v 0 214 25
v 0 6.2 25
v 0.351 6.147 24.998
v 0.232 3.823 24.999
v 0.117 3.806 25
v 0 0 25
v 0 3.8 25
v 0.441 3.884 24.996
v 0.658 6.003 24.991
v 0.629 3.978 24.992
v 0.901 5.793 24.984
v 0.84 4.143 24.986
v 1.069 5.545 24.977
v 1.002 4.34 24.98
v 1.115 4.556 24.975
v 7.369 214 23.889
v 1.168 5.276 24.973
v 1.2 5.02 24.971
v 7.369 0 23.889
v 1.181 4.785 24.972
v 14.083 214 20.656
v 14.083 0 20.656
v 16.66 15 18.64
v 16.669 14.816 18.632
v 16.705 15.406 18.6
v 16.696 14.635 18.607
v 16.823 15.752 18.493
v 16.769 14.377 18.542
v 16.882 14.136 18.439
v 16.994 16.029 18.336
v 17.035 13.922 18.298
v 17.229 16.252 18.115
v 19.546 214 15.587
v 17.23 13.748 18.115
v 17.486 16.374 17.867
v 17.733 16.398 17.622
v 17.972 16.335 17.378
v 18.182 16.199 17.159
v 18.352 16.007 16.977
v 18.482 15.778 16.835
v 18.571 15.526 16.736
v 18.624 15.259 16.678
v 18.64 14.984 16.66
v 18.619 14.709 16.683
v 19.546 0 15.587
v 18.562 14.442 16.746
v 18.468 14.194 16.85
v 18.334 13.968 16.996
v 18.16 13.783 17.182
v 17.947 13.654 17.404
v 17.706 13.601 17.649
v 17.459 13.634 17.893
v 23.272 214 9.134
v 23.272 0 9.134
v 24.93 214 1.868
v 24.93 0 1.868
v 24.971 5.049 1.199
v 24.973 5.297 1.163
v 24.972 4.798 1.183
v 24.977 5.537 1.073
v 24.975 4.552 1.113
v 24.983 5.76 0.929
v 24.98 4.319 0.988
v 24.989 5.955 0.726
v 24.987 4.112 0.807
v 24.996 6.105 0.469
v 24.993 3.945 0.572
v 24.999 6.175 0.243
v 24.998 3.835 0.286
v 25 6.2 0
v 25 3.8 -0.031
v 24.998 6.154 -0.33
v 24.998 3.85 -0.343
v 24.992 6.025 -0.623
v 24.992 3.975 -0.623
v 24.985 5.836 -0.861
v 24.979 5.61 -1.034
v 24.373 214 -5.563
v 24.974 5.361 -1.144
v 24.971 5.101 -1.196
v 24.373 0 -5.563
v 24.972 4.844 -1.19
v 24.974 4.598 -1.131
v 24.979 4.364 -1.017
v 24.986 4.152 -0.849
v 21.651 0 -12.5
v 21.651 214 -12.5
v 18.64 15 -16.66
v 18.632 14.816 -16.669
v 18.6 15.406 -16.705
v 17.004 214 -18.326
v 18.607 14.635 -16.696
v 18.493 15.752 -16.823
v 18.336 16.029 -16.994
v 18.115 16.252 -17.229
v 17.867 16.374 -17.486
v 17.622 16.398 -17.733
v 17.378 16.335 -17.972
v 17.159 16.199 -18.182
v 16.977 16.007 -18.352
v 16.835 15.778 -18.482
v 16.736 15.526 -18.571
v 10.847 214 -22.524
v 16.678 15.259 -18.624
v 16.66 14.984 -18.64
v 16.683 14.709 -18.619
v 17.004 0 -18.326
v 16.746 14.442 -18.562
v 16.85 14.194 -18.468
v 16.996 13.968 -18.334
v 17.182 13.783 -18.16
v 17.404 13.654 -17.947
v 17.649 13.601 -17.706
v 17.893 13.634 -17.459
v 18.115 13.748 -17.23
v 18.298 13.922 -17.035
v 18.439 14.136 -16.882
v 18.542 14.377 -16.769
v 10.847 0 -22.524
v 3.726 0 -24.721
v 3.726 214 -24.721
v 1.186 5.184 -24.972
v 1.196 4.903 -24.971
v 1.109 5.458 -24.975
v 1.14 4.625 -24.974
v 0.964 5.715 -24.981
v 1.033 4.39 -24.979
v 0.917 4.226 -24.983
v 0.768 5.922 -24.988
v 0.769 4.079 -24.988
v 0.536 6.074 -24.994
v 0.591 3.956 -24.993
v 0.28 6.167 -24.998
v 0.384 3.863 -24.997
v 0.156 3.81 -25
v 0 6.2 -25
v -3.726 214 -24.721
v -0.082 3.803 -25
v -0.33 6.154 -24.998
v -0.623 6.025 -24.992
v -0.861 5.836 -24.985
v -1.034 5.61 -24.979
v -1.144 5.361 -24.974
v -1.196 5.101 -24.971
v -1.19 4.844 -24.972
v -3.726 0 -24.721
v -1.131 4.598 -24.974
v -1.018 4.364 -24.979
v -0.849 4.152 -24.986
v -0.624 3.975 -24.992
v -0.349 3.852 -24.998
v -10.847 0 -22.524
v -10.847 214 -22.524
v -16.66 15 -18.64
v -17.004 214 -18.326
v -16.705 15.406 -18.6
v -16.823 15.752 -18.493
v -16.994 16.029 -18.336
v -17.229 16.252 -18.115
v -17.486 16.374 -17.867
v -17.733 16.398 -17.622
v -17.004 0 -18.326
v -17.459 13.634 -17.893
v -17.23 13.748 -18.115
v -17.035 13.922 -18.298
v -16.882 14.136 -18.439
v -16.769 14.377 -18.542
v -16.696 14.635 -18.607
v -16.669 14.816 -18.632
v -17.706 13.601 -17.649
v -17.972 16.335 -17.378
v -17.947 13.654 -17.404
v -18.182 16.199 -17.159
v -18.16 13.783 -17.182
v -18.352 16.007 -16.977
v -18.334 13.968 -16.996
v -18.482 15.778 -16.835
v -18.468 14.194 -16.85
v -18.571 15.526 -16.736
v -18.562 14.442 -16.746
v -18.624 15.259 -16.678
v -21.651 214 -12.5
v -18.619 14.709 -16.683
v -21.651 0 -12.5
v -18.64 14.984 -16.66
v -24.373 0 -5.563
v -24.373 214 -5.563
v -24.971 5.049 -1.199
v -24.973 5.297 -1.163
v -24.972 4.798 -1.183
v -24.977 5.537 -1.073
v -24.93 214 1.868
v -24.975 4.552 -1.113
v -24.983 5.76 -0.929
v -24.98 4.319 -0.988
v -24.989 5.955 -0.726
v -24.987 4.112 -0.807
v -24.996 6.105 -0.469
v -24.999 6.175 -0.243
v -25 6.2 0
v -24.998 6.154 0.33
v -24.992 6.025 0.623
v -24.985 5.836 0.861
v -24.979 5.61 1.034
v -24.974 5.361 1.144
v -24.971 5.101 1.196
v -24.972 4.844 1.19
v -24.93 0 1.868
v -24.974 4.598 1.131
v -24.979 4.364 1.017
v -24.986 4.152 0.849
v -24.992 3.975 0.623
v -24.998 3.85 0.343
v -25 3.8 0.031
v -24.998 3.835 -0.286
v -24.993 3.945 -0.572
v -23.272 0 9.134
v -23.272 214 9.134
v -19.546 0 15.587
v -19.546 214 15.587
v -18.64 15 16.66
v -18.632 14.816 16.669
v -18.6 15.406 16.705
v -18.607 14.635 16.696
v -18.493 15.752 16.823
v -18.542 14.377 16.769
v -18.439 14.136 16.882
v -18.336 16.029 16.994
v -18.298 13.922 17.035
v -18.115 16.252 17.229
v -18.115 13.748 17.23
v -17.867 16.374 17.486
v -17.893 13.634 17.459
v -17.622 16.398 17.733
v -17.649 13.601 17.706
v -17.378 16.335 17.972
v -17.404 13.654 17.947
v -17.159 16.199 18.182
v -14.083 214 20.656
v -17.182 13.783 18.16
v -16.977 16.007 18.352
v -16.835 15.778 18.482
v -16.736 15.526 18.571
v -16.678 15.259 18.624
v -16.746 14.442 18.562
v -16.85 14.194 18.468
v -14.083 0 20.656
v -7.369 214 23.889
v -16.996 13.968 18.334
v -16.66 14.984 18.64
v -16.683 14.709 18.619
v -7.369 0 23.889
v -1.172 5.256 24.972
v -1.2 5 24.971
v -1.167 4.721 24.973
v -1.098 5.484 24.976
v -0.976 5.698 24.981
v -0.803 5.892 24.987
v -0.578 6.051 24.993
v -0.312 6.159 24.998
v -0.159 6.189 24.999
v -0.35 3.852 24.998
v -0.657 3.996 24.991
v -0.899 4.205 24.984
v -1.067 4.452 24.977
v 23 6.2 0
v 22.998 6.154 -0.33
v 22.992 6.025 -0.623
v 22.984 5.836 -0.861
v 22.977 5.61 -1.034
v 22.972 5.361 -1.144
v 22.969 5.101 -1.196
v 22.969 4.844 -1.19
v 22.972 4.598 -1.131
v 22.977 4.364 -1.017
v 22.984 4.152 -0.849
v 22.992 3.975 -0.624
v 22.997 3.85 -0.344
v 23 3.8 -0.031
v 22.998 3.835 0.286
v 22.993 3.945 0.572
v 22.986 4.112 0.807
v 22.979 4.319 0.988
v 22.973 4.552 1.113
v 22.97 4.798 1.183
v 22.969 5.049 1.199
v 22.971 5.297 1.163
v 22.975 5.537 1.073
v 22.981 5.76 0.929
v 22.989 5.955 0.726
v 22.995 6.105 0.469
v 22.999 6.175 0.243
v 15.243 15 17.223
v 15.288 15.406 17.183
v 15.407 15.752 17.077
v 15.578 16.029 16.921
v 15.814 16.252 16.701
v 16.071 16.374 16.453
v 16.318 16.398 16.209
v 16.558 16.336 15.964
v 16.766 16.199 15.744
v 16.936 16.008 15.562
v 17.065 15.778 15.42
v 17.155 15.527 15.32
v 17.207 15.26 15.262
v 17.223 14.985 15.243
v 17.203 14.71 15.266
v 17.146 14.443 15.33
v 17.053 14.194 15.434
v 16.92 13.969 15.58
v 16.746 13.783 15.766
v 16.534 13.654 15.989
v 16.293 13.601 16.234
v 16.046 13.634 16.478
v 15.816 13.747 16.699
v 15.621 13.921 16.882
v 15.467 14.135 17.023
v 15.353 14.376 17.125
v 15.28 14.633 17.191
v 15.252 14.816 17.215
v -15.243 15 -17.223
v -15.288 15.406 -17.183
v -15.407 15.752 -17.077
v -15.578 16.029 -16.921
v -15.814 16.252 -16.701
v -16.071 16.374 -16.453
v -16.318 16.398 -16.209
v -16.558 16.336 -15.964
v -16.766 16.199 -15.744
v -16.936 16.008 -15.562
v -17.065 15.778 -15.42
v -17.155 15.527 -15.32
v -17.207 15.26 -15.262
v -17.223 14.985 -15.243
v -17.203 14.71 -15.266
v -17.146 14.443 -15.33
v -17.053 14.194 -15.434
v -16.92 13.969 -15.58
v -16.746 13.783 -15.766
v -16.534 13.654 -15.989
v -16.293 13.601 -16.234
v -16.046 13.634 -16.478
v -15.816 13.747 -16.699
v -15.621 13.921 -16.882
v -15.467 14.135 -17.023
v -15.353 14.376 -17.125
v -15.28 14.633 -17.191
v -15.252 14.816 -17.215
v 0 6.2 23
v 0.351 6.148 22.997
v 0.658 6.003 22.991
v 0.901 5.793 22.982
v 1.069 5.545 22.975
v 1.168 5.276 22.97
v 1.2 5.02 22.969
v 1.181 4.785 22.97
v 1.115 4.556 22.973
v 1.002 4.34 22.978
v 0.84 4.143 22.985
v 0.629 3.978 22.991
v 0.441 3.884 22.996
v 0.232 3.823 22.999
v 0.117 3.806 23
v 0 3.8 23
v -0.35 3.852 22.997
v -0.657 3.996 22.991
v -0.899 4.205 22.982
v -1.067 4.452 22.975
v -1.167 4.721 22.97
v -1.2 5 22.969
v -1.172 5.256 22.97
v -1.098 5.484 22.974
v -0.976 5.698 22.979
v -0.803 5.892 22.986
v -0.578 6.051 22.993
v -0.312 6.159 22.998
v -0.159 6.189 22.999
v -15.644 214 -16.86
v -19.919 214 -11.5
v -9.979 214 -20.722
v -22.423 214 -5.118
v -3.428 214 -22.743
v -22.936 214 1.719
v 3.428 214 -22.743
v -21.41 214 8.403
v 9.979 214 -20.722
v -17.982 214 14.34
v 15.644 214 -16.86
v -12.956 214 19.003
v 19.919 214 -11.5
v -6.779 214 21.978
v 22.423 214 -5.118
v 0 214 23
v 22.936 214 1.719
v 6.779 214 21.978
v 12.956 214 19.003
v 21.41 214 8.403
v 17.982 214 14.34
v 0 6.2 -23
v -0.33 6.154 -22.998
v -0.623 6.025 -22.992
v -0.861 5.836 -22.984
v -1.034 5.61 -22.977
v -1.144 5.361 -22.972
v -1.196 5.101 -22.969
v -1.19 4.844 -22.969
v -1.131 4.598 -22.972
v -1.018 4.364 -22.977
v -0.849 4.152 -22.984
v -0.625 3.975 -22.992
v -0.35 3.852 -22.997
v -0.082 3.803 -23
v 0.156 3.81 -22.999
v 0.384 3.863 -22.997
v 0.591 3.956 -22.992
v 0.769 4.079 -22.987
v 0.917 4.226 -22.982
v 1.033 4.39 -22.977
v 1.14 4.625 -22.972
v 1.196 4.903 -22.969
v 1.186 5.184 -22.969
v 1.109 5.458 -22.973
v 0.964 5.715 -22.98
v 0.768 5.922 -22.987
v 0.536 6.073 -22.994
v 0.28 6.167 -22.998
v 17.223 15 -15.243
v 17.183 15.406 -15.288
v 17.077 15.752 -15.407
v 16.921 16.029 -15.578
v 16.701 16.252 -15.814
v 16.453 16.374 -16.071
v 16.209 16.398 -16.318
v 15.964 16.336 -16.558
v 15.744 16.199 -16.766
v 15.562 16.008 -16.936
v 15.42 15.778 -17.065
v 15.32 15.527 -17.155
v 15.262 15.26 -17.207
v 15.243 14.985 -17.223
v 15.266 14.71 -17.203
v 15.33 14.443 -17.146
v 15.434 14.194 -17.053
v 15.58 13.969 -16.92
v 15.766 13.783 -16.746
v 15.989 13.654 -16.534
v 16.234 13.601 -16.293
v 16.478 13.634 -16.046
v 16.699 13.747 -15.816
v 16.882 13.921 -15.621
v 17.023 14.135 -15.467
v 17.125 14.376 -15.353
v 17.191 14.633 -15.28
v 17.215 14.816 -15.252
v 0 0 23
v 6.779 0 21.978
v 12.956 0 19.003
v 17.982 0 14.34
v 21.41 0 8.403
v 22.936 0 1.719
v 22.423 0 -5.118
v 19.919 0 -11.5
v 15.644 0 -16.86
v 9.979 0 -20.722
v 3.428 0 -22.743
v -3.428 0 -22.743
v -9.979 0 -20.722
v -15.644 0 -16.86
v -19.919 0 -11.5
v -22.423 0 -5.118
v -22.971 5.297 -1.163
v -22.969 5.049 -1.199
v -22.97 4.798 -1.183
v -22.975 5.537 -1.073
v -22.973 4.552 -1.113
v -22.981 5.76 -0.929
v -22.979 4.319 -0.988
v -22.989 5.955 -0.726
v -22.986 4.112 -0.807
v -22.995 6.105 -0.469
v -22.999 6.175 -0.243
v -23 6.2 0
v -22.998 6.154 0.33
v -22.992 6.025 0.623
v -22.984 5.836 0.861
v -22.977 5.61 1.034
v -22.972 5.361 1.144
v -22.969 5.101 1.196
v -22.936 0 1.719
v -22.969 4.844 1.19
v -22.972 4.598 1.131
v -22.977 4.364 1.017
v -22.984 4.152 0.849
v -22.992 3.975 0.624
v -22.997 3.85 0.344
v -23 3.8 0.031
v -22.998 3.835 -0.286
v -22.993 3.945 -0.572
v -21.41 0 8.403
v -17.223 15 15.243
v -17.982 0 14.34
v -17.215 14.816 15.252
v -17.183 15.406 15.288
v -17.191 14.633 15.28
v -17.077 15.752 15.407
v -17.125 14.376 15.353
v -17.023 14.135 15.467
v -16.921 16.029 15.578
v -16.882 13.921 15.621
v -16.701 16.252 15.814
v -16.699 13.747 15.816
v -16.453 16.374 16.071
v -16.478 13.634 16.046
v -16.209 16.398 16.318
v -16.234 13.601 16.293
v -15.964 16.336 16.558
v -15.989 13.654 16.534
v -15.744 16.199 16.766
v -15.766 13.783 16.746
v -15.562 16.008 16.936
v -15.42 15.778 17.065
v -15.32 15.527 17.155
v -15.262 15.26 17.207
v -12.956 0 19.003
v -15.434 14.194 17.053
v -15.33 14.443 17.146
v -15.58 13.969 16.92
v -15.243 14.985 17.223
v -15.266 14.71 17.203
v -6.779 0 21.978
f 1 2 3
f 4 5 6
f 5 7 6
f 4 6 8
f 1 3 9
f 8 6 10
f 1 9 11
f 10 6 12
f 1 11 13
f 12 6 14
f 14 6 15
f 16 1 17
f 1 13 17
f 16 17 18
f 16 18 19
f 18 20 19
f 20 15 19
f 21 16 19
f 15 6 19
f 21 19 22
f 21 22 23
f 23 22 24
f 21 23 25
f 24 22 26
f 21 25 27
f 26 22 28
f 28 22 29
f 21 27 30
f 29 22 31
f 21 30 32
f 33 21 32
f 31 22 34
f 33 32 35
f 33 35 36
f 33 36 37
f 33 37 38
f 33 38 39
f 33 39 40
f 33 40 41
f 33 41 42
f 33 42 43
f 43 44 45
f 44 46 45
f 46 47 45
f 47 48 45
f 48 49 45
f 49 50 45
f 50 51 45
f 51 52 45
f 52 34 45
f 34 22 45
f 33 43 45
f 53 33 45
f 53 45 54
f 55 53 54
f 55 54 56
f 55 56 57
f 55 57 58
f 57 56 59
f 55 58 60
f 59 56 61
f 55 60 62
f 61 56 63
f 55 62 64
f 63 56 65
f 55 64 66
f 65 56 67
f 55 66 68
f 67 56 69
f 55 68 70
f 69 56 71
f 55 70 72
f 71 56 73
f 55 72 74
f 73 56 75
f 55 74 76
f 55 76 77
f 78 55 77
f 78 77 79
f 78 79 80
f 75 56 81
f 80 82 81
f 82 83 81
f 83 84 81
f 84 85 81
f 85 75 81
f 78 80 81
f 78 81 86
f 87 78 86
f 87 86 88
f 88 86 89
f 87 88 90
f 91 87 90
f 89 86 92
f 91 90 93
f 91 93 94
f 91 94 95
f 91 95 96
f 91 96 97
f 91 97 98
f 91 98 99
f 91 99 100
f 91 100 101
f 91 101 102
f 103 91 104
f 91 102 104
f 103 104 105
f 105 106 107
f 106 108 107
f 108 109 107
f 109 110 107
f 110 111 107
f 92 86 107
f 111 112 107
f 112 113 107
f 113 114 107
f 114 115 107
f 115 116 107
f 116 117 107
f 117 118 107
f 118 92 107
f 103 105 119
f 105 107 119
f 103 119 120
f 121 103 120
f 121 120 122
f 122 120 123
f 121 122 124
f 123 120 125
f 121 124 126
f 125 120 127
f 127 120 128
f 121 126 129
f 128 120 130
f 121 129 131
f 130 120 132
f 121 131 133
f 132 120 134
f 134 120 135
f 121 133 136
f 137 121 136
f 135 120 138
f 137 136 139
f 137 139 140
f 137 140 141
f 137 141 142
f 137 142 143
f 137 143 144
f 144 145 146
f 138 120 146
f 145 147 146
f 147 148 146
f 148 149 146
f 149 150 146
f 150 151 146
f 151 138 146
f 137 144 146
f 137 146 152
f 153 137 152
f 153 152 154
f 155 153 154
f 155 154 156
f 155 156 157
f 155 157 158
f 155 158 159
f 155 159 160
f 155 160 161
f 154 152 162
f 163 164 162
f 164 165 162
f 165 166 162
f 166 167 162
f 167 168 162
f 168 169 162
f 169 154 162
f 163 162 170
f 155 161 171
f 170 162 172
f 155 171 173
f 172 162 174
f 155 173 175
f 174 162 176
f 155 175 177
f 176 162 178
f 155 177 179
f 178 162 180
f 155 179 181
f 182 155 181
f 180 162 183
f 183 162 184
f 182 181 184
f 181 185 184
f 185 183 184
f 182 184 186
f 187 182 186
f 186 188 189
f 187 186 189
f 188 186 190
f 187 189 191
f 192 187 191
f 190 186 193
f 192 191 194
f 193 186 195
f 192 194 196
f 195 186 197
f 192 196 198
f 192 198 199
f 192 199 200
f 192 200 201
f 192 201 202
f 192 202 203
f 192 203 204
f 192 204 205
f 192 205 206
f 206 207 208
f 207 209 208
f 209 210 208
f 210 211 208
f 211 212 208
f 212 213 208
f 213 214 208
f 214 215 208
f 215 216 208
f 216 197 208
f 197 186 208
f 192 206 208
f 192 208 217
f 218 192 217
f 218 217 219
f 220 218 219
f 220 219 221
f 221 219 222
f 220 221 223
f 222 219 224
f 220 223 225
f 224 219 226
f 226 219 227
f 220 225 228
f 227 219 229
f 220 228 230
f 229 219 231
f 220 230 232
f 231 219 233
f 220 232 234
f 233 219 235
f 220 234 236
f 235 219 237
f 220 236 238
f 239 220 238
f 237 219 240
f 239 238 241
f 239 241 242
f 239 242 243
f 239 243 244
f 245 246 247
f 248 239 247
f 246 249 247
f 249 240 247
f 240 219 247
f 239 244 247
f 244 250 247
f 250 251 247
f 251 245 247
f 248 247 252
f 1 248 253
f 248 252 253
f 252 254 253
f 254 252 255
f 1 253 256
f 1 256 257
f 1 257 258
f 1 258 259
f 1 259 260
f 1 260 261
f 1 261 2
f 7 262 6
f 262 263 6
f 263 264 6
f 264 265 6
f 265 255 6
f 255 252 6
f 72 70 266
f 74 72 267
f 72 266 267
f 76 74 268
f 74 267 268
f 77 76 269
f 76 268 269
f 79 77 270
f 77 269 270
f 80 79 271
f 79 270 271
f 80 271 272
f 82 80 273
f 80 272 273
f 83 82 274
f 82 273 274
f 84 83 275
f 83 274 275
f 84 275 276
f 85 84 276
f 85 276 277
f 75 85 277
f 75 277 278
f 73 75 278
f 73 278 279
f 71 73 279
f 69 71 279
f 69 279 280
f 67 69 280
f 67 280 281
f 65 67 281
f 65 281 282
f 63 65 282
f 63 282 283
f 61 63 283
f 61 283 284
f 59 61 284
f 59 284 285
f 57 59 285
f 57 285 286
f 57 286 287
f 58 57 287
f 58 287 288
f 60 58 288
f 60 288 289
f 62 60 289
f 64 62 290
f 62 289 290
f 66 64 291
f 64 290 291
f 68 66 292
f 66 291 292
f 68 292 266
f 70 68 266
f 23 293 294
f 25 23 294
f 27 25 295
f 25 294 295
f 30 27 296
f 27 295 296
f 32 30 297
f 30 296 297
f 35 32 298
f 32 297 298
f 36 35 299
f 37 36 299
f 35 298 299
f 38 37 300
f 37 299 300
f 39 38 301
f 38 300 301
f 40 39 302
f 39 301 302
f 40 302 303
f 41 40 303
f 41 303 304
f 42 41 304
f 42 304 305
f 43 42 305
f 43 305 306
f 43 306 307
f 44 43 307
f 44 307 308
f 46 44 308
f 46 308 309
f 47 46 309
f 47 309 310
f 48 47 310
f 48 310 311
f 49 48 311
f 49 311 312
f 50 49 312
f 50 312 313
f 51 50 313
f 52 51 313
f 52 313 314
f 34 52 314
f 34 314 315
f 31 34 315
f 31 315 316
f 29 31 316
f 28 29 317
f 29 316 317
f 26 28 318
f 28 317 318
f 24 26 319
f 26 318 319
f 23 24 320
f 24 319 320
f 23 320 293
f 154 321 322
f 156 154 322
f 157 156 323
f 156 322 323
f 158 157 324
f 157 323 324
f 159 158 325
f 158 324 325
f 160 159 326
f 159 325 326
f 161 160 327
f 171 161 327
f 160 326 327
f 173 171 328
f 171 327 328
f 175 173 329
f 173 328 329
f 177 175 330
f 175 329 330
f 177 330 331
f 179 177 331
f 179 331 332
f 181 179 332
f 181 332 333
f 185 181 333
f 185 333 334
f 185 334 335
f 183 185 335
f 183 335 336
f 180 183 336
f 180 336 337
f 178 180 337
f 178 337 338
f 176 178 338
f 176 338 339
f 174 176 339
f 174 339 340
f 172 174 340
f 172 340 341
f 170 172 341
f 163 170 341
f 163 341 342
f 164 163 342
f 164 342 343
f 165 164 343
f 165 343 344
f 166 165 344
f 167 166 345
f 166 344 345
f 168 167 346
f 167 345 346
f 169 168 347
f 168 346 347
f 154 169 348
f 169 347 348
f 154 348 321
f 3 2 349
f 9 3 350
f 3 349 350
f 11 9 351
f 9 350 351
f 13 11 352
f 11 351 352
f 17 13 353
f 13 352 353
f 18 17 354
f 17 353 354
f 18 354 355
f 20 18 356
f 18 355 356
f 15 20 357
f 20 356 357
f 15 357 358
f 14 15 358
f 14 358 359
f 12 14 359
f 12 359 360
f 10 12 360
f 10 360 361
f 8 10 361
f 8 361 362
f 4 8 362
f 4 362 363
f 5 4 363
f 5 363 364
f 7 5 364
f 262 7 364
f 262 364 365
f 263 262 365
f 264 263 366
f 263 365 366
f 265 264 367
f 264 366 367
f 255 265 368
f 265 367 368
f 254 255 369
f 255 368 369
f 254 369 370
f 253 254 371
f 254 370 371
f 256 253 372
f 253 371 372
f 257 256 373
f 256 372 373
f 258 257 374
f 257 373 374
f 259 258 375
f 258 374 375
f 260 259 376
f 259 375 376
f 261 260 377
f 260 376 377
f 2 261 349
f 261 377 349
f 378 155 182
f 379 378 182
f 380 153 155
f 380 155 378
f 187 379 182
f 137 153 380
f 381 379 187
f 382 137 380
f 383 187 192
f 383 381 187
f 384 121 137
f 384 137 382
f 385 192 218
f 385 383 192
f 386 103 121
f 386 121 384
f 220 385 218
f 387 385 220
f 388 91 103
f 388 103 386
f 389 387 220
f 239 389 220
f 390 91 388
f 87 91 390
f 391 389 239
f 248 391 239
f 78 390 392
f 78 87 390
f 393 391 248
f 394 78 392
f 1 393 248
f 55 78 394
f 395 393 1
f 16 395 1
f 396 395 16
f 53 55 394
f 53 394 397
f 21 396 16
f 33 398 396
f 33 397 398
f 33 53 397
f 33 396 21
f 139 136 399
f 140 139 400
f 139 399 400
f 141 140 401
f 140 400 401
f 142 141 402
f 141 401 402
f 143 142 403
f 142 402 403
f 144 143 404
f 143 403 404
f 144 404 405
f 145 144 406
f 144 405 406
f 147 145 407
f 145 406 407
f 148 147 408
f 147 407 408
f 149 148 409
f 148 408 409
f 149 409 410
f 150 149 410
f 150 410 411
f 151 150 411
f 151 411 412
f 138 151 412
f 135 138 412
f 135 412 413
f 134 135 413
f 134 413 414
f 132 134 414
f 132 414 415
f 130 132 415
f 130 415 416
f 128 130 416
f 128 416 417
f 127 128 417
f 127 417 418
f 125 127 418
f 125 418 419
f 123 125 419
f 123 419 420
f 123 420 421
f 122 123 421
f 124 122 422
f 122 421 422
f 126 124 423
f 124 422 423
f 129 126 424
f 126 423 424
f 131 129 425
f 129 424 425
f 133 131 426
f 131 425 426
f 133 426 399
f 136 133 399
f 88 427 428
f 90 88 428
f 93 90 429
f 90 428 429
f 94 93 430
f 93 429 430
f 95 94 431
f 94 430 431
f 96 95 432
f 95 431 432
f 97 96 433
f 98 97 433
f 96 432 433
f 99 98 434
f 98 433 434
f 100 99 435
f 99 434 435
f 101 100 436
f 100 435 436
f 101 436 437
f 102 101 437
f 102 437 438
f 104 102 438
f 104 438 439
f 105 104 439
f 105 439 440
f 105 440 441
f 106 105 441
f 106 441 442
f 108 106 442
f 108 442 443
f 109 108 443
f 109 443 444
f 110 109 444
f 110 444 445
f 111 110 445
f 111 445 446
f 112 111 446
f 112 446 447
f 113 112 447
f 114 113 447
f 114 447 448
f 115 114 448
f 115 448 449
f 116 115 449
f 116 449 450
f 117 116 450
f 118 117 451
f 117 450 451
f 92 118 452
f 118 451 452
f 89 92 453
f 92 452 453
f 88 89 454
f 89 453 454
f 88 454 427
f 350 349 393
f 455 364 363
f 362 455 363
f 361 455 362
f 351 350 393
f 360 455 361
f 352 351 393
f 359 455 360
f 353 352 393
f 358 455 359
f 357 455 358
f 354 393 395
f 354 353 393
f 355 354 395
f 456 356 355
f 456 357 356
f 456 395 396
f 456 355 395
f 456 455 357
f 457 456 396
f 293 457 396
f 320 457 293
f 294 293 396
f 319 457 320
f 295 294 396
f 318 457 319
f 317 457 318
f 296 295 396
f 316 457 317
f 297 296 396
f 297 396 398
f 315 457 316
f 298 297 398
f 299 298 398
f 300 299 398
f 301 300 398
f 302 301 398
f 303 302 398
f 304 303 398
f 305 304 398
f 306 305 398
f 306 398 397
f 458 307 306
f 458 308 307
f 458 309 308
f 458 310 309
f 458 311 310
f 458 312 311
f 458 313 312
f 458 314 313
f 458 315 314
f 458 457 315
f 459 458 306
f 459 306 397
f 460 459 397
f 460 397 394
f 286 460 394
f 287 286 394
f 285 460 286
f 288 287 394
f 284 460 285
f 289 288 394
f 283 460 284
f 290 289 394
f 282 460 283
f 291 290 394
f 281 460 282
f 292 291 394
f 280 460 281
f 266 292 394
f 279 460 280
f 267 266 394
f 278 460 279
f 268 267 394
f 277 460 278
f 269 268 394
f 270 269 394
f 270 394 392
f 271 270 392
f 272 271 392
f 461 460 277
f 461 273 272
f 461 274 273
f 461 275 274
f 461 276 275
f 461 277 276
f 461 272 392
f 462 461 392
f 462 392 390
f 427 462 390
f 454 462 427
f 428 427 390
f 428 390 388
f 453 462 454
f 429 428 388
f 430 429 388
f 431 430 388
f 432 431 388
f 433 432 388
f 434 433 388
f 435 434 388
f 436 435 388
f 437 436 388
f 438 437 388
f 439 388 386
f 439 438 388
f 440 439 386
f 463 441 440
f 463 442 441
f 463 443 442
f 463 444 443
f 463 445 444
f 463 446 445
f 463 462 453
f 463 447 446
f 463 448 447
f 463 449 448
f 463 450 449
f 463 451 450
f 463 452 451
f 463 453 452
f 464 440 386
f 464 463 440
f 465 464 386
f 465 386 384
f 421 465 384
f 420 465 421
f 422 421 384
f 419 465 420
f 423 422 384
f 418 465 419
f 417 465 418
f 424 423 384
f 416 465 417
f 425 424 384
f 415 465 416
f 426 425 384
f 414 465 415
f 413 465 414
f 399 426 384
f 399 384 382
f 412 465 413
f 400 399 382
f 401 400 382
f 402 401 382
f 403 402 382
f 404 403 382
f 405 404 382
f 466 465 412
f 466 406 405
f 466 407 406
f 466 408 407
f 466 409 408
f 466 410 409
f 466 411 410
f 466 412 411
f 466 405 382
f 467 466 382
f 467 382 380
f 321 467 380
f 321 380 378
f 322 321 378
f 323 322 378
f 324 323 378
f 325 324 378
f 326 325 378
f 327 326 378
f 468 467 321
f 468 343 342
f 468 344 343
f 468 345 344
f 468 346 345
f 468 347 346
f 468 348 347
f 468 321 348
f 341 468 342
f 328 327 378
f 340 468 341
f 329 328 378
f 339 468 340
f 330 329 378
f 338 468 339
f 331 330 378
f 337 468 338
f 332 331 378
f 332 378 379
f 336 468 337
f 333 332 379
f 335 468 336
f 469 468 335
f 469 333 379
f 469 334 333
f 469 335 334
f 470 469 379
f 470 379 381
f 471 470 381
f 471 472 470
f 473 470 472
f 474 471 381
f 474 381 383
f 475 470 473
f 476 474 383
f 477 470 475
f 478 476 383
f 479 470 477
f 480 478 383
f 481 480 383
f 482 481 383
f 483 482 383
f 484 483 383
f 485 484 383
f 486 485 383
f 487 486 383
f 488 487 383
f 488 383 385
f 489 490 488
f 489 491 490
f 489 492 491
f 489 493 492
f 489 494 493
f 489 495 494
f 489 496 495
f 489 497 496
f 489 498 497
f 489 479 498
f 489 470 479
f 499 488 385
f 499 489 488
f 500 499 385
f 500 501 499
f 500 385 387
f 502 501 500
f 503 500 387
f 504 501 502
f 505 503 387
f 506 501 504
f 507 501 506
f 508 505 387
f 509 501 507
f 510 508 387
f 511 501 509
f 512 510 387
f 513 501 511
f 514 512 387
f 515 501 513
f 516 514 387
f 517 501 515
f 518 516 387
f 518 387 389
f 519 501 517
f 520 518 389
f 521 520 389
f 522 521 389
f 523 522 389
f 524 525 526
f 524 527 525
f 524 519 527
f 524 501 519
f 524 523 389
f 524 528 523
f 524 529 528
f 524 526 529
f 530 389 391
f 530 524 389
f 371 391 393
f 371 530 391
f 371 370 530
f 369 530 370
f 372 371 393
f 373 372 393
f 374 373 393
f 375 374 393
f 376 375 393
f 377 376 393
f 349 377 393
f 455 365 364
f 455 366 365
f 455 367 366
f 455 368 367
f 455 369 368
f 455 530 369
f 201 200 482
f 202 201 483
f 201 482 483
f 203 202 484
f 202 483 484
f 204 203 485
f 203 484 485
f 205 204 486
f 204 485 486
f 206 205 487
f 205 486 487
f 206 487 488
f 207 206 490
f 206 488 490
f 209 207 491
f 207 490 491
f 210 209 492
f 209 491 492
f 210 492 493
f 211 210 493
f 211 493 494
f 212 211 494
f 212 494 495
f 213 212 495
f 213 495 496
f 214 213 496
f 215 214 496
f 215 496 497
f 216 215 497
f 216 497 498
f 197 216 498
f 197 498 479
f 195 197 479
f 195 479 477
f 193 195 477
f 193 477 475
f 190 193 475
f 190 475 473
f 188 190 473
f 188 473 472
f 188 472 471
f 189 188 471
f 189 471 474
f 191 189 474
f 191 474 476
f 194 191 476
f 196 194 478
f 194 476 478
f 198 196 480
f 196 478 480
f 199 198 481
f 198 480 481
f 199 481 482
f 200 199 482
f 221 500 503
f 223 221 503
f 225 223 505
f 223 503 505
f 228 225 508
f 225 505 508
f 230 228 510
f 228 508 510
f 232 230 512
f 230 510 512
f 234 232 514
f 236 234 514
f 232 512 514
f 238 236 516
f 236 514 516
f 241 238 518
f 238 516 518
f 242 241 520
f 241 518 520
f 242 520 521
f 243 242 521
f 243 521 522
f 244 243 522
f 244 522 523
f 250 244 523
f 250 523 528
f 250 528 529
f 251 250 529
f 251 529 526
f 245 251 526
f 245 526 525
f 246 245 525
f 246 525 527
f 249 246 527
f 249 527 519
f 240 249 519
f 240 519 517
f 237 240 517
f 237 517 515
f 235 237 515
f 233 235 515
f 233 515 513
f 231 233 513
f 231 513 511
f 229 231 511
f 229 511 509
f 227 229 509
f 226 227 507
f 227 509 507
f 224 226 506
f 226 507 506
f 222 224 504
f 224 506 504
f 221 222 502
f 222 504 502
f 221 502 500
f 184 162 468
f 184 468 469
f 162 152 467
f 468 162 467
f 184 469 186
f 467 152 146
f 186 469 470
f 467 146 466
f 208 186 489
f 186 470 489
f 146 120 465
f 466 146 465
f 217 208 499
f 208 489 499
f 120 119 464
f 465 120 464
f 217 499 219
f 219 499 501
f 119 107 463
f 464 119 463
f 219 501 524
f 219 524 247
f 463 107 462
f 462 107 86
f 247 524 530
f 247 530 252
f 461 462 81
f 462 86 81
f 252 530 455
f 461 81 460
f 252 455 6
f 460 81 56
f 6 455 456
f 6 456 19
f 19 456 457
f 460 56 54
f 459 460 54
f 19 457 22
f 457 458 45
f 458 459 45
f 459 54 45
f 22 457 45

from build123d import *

# Parameters (mm, degrees)
SKETCH_1_R               = 25
SKETCH_1_R_2             = 23
EXTRUDE_1_DEPTH          = 214
SKETCH_5_R               = 1.2
CUT_EXTRUDE_5_DEPTH      = 217.90089903
PATTERN_CIRCULAR_1_COUNT = 4
SKETCH_6_R               = 1.4
CUT_EXTRUDE_6_DEPTH      = 217.900899153
PATTERN_CIRCULAR_2_COUNT = 4


with BuildPart() as part:
    # Эскиз1 → Бобышка-Вытянуть1 (new body)
    with BuildSketch(Plane(origin=(0, 0, 0), x_dir=(1, 0, 0), z_dir=(0, 1, 0))):
        with Locations(Location((0, 0, 0), (0, 0, 270))):
            Circle(SKETCH_1_R)
        with Locations(Location((0, 0, 0), (0, 0, 270))):
            Circle(SKETCH_1_R_2, mode=Mode.SUBTRACT)
    extrude(amount=EXTRUDE_1_DEPTH)

    # Эскиз5 → Вырез-Вытянуть5 (cut, through all)
    with BuildSketch(Plane.XY):
        with Locations(Location((0, 5, 0), (0, 0, 90))):
            Circle(SKETCH_5_R)
    cut_extrude_5 = extrude(amount=-CUT_EXTRUDE_5_DEPTH, mode=Mode.SUBTRACT)

    # Круговой массив1: Вырез-Вытянуть5 ×4 about axis
    pattern_circular_1_axis = Axis((0, 214, 0), (0, -1, 0))
    for i in range(1, PATTERN_CIRCULAR_1_COUNT):
        add(cut_extrude_5.rotate(pattern_circular_1_axis, i * 360 / PATTERN_CIRCULAR_1_COUNT), mode=Mode.SUBTRACT)

    # Эскиз6 → Вырез-Вытянуть6 (cut, through all)
    with BuildSketch(Plane(origin=(0, 0, 0), x_dir=(0, -1, 0), z_dir=(-0.7071067811865488, 0, 0.7071067811865464))):
        with Locations(Location((-15, 0, 0), (0, 0, 90))):
            Circle(SKETCH_6_R)
    cut_extrude_6 = extrude(amount=-CUT_EXTRUDE_6_DEPTH, mode=Mode.SUBTRACT)

    # Круговой массив2: Вырез-Вытянуть6 ×4 about axis
    pattern_circular_2_axis = Axis((0, 214, 0), (0, -1, 0))
    for i in range(1, PATTERN_CIRCULAR_2_COUNT):
        add(cut_extrude_6.rotate(pattern_circular_2_axis, i * 360 / PATTERN_CIRCULAR_2_COUNT), mode=Mode.SUBTRACT)


solid = part.part
